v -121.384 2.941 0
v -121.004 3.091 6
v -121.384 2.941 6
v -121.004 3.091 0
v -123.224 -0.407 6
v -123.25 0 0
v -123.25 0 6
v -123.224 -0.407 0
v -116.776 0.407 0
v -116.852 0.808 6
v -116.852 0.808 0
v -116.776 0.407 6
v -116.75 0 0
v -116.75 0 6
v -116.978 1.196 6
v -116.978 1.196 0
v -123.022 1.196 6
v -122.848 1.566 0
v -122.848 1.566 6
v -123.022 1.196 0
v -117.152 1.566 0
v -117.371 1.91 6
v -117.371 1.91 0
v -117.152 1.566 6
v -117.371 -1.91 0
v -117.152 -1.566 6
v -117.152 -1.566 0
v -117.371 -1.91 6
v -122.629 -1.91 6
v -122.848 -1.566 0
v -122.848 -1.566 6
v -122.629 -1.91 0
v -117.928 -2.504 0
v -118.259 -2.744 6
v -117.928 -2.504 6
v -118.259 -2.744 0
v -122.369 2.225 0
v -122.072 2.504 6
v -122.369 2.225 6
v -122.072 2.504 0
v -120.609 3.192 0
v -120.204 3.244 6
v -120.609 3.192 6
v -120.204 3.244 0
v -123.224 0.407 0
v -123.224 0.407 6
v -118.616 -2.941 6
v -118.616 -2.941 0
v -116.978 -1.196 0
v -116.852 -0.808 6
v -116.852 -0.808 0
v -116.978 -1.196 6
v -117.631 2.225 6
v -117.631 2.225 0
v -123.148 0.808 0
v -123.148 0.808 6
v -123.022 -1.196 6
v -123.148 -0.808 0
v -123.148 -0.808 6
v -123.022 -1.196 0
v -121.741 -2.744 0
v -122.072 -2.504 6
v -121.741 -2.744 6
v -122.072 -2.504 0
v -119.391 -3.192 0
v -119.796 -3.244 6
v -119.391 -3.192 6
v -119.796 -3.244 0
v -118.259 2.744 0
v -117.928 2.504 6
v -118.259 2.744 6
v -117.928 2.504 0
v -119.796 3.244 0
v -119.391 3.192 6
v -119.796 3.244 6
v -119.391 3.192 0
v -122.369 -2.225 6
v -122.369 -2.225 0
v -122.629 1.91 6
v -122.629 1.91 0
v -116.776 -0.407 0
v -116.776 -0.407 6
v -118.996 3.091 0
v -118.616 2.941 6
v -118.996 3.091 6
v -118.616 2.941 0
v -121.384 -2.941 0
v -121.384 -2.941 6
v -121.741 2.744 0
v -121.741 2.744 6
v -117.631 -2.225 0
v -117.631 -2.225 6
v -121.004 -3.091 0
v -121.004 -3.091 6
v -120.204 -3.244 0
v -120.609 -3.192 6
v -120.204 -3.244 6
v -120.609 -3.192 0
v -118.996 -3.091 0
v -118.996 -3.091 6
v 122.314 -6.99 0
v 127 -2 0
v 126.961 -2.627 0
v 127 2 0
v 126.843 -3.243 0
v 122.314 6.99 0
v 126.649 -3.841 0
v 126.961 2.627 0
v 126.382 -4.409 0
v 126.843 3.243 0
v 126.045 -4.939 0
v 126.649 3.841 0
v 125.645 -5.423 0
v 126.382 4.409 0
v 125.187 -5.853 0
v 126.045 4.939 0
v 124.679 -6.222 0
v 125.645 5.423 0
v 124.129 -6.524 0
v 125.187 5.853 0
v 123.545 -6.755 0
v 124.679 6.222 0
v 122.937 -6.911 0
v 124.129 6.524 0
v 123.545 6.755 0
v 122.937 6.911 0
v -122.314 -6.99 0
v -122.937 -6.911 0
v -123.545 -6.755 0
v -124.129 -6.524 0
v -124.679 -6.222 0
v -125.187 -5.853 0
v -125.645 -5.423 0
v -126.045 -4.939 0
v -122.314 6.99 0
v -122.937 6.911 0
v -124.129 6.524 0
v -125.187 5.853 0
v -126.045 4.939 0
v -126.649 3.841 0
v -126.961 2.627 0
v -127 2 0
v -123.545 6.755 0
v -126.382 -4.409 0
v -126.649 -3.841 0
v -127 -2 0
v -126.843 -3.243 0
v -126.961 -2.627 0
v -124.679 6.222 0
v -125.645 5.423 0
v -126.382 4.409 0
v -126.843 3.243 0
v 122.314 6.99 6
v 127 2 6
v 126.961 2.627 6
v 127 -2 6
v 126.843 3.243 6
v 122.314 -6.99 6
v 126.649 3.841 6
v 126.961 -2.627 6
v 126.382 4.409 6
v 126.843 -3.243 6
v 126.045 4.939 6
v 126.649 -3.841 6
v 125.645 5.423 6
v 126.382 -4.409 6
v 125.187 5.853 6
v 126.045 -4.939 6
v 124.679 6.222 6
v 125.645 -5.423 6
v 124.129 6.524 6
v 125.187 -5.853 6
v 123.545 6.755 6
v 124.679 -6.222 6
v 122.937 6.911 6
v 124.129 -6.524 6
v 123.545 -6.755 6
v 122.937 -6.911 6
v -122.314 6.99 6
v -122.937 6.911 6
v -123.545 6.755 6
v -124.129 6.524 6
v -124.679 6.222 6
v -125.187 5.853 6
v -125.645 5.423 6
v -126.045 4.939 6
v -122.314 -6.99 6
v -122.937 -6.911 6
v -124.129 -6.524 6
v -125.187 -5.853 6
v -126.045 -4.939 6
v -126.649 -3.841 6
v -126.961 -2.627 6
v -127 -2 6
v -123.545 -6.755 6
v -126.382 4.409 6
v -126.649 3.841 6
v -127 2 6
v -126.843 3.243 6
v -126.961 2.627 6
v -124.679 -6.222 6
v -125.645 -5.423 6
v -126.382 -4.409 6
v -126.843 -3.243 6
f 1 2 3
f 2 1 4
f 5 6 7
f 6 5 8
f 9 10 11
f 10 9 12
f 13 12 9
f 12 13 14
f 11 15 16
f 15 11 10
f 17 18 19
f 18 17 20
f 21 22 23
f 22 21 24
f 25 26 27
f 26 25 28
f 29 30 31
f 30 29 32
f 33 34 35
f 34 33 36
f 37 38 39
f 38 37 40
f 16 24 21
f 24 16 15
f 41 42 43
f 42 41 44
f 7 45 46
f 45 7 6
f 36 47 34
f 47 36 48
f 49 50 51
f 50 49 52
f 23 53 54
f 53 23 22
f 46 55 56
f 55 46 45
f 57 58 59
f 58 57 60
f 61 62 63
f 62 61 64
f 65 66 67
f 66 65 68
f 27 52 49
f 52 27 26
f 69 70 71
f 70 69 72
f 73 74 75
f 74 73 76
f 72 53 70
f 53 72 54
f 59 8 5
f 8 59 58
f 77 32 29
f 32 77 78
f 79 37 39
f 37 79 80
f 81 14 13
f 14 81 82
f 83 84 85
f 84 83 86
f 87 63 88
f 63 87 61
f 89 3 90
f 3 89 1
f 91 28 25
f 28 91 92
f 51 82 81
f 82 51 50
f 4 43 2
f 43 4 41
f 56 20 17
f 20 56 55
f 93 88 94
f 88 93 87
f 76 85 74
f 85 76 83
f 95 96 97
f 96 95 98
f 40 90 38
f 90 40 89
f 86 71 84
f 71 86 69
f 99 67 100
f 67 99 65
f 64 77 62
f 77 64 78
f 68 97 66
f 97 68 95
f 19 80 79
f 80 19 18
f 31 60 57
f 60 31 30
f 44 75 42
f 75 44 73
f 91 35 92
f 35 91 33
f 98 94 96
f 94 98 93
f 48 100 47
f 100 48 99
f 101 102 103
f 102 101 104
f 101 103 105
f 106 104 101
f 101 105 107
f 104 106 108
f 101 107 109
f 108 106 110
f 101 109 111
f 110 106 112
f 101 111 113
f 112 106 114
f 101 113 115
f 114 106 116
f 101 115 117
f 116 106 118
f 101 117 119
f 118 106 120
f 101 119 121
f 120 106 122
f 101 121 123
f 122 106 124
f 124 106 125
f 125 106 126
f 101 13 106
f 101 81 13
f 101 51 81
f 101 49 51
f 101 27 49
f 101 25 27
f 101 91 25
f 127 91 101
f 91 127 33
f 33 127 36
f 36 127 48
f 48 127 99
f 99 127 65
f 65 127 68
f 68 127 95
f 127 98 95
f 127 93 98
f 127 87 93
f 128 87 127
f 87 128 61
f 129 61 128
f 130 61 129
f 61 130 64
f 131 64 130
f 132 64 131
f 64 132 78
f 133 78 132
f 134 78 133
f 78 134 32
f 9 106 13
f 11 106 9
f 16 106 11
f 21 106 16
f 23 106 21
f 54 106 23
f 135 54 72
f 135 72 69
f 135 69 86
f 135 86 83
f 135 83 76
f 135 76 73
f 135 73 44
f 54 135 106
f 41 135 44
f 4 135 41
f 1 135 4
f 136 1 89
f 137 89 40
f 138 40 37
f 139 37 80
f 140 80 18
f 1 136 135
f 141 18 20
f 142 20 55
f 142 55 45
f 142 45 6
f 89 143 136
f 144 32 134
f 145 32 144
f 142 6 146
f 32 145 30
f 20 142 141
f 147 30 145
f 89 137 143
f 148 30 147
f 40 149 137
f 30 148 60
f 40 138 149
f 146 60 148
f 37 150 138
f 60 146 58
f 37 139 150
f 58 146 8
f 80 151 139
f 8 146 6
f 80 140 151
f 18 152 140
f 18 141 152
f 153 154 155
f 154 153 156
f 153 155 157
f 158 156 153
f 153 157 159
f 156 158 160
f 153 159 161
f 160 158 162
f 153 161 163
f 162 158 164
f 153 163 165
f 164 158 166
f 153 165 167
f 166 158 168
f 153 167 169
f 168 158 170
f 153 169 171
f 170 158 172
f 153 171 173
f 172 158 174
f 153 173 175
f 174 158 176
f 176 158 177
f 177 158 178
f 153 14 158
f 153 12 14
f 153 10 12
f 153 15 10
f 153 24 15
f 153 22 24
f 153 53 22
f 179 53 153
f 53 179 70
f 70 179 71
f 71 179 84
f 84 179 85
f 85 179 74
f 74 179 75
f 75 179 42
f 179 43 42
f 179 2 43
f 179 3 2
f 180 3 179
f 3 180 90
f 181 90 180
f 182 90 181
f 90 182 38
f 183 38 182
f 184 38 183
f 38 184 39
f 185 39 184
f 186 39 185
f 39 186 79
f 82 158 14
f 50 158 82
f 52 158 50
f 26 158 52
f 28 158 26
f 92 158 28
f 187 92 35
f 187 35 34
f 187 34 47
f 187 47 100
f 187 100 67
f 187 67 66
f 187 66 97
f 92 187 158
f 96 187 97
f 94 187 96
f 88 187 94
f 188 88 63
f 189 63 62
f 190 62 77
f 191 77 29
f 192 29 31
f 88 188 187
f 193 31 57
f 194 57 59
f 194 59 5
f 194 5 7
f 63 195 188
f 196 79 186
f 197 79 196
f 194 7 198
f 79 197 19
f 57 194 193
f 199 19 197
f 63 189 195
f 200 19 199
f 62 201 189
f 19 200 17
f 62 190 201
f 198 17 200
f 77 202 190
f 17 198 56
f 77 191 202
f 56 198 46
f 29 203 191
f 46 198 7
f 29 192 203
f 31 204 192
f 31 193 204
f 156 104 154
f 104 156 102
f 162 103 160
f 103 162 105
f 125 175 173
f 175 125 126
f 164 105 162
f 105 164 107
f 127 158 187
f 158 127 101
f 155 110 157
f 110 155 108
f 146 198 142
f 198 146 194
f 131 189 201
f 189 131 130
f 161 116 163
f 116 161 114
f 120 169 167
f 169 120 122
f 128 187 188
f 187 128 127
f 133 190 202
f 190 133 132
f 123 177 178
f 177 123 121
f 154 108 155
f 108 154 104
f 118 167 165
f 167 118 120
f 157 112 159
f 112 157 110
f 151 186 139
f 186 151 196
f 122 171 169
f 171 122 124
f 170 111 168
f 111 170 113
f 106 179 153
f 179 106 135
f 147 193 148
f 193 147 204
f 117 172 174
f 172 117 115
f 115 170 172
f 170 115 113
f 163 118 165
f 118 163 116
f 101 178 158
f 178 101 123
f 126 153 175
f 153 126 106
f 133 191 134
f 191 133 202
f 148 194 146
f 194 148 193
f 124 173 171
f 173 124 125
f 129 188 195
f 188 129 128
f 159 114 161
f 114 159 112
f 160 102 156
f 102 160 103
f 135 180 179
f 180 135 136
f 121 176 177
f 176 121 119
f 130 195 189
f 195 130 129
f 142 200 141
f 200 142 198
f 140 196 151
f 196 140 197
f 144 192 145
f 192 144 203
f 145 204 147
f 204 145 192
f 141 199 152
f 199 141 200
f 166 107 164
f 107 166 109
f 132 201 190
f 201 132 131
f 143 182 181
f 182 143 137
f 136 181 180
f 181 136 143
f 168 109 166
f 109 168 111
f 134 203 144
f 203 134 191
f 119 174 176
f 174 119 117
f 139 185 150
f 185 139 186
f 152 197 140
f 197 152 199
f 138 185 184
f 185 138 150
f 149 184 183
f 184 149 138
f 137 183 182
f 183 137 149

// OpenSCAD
$fn = 50;


difference() {
	union() {
		hull() {
			translate(v = [-122.0000000000, 2.0000000000, 0]) {
				cylinder(h = 6, r = 5);
			}
			translate(v = [122.0000000000, 2.0000000000, 0]) {
				cylinder(h = 6, r = 5);
			}
			translate(v = [-122.0000000000, -2.0000000000, 0]) {
				cylinder(h = 6, r = 5);
			}
			translate(v = [122.0000000000, -2.0000000000, 0]) {
				cylinder(h = 6, r = 5);
			}
		}
	}
	union() {
		translate(v = [-120.0000000000, 0.0000000000, 0]) {
			cylinder(h = 6, r = 3.2500000000);
		}
		translate(v = [-120.0000000000, 0.0000000000, 0]) {
			cylinder(h = 6, r = 1.8000000000);
		}
		translate(v = [-120.0000000000, 0.0000000000, 0]) {
			cylinder(h = 6, r = 1.8000000000);
		}
		translate(v = [-120.0000000000, 0.0000000000, 0]) {
			cylinder(h = 6, r = 1.8000000000);
		}
	}
}
